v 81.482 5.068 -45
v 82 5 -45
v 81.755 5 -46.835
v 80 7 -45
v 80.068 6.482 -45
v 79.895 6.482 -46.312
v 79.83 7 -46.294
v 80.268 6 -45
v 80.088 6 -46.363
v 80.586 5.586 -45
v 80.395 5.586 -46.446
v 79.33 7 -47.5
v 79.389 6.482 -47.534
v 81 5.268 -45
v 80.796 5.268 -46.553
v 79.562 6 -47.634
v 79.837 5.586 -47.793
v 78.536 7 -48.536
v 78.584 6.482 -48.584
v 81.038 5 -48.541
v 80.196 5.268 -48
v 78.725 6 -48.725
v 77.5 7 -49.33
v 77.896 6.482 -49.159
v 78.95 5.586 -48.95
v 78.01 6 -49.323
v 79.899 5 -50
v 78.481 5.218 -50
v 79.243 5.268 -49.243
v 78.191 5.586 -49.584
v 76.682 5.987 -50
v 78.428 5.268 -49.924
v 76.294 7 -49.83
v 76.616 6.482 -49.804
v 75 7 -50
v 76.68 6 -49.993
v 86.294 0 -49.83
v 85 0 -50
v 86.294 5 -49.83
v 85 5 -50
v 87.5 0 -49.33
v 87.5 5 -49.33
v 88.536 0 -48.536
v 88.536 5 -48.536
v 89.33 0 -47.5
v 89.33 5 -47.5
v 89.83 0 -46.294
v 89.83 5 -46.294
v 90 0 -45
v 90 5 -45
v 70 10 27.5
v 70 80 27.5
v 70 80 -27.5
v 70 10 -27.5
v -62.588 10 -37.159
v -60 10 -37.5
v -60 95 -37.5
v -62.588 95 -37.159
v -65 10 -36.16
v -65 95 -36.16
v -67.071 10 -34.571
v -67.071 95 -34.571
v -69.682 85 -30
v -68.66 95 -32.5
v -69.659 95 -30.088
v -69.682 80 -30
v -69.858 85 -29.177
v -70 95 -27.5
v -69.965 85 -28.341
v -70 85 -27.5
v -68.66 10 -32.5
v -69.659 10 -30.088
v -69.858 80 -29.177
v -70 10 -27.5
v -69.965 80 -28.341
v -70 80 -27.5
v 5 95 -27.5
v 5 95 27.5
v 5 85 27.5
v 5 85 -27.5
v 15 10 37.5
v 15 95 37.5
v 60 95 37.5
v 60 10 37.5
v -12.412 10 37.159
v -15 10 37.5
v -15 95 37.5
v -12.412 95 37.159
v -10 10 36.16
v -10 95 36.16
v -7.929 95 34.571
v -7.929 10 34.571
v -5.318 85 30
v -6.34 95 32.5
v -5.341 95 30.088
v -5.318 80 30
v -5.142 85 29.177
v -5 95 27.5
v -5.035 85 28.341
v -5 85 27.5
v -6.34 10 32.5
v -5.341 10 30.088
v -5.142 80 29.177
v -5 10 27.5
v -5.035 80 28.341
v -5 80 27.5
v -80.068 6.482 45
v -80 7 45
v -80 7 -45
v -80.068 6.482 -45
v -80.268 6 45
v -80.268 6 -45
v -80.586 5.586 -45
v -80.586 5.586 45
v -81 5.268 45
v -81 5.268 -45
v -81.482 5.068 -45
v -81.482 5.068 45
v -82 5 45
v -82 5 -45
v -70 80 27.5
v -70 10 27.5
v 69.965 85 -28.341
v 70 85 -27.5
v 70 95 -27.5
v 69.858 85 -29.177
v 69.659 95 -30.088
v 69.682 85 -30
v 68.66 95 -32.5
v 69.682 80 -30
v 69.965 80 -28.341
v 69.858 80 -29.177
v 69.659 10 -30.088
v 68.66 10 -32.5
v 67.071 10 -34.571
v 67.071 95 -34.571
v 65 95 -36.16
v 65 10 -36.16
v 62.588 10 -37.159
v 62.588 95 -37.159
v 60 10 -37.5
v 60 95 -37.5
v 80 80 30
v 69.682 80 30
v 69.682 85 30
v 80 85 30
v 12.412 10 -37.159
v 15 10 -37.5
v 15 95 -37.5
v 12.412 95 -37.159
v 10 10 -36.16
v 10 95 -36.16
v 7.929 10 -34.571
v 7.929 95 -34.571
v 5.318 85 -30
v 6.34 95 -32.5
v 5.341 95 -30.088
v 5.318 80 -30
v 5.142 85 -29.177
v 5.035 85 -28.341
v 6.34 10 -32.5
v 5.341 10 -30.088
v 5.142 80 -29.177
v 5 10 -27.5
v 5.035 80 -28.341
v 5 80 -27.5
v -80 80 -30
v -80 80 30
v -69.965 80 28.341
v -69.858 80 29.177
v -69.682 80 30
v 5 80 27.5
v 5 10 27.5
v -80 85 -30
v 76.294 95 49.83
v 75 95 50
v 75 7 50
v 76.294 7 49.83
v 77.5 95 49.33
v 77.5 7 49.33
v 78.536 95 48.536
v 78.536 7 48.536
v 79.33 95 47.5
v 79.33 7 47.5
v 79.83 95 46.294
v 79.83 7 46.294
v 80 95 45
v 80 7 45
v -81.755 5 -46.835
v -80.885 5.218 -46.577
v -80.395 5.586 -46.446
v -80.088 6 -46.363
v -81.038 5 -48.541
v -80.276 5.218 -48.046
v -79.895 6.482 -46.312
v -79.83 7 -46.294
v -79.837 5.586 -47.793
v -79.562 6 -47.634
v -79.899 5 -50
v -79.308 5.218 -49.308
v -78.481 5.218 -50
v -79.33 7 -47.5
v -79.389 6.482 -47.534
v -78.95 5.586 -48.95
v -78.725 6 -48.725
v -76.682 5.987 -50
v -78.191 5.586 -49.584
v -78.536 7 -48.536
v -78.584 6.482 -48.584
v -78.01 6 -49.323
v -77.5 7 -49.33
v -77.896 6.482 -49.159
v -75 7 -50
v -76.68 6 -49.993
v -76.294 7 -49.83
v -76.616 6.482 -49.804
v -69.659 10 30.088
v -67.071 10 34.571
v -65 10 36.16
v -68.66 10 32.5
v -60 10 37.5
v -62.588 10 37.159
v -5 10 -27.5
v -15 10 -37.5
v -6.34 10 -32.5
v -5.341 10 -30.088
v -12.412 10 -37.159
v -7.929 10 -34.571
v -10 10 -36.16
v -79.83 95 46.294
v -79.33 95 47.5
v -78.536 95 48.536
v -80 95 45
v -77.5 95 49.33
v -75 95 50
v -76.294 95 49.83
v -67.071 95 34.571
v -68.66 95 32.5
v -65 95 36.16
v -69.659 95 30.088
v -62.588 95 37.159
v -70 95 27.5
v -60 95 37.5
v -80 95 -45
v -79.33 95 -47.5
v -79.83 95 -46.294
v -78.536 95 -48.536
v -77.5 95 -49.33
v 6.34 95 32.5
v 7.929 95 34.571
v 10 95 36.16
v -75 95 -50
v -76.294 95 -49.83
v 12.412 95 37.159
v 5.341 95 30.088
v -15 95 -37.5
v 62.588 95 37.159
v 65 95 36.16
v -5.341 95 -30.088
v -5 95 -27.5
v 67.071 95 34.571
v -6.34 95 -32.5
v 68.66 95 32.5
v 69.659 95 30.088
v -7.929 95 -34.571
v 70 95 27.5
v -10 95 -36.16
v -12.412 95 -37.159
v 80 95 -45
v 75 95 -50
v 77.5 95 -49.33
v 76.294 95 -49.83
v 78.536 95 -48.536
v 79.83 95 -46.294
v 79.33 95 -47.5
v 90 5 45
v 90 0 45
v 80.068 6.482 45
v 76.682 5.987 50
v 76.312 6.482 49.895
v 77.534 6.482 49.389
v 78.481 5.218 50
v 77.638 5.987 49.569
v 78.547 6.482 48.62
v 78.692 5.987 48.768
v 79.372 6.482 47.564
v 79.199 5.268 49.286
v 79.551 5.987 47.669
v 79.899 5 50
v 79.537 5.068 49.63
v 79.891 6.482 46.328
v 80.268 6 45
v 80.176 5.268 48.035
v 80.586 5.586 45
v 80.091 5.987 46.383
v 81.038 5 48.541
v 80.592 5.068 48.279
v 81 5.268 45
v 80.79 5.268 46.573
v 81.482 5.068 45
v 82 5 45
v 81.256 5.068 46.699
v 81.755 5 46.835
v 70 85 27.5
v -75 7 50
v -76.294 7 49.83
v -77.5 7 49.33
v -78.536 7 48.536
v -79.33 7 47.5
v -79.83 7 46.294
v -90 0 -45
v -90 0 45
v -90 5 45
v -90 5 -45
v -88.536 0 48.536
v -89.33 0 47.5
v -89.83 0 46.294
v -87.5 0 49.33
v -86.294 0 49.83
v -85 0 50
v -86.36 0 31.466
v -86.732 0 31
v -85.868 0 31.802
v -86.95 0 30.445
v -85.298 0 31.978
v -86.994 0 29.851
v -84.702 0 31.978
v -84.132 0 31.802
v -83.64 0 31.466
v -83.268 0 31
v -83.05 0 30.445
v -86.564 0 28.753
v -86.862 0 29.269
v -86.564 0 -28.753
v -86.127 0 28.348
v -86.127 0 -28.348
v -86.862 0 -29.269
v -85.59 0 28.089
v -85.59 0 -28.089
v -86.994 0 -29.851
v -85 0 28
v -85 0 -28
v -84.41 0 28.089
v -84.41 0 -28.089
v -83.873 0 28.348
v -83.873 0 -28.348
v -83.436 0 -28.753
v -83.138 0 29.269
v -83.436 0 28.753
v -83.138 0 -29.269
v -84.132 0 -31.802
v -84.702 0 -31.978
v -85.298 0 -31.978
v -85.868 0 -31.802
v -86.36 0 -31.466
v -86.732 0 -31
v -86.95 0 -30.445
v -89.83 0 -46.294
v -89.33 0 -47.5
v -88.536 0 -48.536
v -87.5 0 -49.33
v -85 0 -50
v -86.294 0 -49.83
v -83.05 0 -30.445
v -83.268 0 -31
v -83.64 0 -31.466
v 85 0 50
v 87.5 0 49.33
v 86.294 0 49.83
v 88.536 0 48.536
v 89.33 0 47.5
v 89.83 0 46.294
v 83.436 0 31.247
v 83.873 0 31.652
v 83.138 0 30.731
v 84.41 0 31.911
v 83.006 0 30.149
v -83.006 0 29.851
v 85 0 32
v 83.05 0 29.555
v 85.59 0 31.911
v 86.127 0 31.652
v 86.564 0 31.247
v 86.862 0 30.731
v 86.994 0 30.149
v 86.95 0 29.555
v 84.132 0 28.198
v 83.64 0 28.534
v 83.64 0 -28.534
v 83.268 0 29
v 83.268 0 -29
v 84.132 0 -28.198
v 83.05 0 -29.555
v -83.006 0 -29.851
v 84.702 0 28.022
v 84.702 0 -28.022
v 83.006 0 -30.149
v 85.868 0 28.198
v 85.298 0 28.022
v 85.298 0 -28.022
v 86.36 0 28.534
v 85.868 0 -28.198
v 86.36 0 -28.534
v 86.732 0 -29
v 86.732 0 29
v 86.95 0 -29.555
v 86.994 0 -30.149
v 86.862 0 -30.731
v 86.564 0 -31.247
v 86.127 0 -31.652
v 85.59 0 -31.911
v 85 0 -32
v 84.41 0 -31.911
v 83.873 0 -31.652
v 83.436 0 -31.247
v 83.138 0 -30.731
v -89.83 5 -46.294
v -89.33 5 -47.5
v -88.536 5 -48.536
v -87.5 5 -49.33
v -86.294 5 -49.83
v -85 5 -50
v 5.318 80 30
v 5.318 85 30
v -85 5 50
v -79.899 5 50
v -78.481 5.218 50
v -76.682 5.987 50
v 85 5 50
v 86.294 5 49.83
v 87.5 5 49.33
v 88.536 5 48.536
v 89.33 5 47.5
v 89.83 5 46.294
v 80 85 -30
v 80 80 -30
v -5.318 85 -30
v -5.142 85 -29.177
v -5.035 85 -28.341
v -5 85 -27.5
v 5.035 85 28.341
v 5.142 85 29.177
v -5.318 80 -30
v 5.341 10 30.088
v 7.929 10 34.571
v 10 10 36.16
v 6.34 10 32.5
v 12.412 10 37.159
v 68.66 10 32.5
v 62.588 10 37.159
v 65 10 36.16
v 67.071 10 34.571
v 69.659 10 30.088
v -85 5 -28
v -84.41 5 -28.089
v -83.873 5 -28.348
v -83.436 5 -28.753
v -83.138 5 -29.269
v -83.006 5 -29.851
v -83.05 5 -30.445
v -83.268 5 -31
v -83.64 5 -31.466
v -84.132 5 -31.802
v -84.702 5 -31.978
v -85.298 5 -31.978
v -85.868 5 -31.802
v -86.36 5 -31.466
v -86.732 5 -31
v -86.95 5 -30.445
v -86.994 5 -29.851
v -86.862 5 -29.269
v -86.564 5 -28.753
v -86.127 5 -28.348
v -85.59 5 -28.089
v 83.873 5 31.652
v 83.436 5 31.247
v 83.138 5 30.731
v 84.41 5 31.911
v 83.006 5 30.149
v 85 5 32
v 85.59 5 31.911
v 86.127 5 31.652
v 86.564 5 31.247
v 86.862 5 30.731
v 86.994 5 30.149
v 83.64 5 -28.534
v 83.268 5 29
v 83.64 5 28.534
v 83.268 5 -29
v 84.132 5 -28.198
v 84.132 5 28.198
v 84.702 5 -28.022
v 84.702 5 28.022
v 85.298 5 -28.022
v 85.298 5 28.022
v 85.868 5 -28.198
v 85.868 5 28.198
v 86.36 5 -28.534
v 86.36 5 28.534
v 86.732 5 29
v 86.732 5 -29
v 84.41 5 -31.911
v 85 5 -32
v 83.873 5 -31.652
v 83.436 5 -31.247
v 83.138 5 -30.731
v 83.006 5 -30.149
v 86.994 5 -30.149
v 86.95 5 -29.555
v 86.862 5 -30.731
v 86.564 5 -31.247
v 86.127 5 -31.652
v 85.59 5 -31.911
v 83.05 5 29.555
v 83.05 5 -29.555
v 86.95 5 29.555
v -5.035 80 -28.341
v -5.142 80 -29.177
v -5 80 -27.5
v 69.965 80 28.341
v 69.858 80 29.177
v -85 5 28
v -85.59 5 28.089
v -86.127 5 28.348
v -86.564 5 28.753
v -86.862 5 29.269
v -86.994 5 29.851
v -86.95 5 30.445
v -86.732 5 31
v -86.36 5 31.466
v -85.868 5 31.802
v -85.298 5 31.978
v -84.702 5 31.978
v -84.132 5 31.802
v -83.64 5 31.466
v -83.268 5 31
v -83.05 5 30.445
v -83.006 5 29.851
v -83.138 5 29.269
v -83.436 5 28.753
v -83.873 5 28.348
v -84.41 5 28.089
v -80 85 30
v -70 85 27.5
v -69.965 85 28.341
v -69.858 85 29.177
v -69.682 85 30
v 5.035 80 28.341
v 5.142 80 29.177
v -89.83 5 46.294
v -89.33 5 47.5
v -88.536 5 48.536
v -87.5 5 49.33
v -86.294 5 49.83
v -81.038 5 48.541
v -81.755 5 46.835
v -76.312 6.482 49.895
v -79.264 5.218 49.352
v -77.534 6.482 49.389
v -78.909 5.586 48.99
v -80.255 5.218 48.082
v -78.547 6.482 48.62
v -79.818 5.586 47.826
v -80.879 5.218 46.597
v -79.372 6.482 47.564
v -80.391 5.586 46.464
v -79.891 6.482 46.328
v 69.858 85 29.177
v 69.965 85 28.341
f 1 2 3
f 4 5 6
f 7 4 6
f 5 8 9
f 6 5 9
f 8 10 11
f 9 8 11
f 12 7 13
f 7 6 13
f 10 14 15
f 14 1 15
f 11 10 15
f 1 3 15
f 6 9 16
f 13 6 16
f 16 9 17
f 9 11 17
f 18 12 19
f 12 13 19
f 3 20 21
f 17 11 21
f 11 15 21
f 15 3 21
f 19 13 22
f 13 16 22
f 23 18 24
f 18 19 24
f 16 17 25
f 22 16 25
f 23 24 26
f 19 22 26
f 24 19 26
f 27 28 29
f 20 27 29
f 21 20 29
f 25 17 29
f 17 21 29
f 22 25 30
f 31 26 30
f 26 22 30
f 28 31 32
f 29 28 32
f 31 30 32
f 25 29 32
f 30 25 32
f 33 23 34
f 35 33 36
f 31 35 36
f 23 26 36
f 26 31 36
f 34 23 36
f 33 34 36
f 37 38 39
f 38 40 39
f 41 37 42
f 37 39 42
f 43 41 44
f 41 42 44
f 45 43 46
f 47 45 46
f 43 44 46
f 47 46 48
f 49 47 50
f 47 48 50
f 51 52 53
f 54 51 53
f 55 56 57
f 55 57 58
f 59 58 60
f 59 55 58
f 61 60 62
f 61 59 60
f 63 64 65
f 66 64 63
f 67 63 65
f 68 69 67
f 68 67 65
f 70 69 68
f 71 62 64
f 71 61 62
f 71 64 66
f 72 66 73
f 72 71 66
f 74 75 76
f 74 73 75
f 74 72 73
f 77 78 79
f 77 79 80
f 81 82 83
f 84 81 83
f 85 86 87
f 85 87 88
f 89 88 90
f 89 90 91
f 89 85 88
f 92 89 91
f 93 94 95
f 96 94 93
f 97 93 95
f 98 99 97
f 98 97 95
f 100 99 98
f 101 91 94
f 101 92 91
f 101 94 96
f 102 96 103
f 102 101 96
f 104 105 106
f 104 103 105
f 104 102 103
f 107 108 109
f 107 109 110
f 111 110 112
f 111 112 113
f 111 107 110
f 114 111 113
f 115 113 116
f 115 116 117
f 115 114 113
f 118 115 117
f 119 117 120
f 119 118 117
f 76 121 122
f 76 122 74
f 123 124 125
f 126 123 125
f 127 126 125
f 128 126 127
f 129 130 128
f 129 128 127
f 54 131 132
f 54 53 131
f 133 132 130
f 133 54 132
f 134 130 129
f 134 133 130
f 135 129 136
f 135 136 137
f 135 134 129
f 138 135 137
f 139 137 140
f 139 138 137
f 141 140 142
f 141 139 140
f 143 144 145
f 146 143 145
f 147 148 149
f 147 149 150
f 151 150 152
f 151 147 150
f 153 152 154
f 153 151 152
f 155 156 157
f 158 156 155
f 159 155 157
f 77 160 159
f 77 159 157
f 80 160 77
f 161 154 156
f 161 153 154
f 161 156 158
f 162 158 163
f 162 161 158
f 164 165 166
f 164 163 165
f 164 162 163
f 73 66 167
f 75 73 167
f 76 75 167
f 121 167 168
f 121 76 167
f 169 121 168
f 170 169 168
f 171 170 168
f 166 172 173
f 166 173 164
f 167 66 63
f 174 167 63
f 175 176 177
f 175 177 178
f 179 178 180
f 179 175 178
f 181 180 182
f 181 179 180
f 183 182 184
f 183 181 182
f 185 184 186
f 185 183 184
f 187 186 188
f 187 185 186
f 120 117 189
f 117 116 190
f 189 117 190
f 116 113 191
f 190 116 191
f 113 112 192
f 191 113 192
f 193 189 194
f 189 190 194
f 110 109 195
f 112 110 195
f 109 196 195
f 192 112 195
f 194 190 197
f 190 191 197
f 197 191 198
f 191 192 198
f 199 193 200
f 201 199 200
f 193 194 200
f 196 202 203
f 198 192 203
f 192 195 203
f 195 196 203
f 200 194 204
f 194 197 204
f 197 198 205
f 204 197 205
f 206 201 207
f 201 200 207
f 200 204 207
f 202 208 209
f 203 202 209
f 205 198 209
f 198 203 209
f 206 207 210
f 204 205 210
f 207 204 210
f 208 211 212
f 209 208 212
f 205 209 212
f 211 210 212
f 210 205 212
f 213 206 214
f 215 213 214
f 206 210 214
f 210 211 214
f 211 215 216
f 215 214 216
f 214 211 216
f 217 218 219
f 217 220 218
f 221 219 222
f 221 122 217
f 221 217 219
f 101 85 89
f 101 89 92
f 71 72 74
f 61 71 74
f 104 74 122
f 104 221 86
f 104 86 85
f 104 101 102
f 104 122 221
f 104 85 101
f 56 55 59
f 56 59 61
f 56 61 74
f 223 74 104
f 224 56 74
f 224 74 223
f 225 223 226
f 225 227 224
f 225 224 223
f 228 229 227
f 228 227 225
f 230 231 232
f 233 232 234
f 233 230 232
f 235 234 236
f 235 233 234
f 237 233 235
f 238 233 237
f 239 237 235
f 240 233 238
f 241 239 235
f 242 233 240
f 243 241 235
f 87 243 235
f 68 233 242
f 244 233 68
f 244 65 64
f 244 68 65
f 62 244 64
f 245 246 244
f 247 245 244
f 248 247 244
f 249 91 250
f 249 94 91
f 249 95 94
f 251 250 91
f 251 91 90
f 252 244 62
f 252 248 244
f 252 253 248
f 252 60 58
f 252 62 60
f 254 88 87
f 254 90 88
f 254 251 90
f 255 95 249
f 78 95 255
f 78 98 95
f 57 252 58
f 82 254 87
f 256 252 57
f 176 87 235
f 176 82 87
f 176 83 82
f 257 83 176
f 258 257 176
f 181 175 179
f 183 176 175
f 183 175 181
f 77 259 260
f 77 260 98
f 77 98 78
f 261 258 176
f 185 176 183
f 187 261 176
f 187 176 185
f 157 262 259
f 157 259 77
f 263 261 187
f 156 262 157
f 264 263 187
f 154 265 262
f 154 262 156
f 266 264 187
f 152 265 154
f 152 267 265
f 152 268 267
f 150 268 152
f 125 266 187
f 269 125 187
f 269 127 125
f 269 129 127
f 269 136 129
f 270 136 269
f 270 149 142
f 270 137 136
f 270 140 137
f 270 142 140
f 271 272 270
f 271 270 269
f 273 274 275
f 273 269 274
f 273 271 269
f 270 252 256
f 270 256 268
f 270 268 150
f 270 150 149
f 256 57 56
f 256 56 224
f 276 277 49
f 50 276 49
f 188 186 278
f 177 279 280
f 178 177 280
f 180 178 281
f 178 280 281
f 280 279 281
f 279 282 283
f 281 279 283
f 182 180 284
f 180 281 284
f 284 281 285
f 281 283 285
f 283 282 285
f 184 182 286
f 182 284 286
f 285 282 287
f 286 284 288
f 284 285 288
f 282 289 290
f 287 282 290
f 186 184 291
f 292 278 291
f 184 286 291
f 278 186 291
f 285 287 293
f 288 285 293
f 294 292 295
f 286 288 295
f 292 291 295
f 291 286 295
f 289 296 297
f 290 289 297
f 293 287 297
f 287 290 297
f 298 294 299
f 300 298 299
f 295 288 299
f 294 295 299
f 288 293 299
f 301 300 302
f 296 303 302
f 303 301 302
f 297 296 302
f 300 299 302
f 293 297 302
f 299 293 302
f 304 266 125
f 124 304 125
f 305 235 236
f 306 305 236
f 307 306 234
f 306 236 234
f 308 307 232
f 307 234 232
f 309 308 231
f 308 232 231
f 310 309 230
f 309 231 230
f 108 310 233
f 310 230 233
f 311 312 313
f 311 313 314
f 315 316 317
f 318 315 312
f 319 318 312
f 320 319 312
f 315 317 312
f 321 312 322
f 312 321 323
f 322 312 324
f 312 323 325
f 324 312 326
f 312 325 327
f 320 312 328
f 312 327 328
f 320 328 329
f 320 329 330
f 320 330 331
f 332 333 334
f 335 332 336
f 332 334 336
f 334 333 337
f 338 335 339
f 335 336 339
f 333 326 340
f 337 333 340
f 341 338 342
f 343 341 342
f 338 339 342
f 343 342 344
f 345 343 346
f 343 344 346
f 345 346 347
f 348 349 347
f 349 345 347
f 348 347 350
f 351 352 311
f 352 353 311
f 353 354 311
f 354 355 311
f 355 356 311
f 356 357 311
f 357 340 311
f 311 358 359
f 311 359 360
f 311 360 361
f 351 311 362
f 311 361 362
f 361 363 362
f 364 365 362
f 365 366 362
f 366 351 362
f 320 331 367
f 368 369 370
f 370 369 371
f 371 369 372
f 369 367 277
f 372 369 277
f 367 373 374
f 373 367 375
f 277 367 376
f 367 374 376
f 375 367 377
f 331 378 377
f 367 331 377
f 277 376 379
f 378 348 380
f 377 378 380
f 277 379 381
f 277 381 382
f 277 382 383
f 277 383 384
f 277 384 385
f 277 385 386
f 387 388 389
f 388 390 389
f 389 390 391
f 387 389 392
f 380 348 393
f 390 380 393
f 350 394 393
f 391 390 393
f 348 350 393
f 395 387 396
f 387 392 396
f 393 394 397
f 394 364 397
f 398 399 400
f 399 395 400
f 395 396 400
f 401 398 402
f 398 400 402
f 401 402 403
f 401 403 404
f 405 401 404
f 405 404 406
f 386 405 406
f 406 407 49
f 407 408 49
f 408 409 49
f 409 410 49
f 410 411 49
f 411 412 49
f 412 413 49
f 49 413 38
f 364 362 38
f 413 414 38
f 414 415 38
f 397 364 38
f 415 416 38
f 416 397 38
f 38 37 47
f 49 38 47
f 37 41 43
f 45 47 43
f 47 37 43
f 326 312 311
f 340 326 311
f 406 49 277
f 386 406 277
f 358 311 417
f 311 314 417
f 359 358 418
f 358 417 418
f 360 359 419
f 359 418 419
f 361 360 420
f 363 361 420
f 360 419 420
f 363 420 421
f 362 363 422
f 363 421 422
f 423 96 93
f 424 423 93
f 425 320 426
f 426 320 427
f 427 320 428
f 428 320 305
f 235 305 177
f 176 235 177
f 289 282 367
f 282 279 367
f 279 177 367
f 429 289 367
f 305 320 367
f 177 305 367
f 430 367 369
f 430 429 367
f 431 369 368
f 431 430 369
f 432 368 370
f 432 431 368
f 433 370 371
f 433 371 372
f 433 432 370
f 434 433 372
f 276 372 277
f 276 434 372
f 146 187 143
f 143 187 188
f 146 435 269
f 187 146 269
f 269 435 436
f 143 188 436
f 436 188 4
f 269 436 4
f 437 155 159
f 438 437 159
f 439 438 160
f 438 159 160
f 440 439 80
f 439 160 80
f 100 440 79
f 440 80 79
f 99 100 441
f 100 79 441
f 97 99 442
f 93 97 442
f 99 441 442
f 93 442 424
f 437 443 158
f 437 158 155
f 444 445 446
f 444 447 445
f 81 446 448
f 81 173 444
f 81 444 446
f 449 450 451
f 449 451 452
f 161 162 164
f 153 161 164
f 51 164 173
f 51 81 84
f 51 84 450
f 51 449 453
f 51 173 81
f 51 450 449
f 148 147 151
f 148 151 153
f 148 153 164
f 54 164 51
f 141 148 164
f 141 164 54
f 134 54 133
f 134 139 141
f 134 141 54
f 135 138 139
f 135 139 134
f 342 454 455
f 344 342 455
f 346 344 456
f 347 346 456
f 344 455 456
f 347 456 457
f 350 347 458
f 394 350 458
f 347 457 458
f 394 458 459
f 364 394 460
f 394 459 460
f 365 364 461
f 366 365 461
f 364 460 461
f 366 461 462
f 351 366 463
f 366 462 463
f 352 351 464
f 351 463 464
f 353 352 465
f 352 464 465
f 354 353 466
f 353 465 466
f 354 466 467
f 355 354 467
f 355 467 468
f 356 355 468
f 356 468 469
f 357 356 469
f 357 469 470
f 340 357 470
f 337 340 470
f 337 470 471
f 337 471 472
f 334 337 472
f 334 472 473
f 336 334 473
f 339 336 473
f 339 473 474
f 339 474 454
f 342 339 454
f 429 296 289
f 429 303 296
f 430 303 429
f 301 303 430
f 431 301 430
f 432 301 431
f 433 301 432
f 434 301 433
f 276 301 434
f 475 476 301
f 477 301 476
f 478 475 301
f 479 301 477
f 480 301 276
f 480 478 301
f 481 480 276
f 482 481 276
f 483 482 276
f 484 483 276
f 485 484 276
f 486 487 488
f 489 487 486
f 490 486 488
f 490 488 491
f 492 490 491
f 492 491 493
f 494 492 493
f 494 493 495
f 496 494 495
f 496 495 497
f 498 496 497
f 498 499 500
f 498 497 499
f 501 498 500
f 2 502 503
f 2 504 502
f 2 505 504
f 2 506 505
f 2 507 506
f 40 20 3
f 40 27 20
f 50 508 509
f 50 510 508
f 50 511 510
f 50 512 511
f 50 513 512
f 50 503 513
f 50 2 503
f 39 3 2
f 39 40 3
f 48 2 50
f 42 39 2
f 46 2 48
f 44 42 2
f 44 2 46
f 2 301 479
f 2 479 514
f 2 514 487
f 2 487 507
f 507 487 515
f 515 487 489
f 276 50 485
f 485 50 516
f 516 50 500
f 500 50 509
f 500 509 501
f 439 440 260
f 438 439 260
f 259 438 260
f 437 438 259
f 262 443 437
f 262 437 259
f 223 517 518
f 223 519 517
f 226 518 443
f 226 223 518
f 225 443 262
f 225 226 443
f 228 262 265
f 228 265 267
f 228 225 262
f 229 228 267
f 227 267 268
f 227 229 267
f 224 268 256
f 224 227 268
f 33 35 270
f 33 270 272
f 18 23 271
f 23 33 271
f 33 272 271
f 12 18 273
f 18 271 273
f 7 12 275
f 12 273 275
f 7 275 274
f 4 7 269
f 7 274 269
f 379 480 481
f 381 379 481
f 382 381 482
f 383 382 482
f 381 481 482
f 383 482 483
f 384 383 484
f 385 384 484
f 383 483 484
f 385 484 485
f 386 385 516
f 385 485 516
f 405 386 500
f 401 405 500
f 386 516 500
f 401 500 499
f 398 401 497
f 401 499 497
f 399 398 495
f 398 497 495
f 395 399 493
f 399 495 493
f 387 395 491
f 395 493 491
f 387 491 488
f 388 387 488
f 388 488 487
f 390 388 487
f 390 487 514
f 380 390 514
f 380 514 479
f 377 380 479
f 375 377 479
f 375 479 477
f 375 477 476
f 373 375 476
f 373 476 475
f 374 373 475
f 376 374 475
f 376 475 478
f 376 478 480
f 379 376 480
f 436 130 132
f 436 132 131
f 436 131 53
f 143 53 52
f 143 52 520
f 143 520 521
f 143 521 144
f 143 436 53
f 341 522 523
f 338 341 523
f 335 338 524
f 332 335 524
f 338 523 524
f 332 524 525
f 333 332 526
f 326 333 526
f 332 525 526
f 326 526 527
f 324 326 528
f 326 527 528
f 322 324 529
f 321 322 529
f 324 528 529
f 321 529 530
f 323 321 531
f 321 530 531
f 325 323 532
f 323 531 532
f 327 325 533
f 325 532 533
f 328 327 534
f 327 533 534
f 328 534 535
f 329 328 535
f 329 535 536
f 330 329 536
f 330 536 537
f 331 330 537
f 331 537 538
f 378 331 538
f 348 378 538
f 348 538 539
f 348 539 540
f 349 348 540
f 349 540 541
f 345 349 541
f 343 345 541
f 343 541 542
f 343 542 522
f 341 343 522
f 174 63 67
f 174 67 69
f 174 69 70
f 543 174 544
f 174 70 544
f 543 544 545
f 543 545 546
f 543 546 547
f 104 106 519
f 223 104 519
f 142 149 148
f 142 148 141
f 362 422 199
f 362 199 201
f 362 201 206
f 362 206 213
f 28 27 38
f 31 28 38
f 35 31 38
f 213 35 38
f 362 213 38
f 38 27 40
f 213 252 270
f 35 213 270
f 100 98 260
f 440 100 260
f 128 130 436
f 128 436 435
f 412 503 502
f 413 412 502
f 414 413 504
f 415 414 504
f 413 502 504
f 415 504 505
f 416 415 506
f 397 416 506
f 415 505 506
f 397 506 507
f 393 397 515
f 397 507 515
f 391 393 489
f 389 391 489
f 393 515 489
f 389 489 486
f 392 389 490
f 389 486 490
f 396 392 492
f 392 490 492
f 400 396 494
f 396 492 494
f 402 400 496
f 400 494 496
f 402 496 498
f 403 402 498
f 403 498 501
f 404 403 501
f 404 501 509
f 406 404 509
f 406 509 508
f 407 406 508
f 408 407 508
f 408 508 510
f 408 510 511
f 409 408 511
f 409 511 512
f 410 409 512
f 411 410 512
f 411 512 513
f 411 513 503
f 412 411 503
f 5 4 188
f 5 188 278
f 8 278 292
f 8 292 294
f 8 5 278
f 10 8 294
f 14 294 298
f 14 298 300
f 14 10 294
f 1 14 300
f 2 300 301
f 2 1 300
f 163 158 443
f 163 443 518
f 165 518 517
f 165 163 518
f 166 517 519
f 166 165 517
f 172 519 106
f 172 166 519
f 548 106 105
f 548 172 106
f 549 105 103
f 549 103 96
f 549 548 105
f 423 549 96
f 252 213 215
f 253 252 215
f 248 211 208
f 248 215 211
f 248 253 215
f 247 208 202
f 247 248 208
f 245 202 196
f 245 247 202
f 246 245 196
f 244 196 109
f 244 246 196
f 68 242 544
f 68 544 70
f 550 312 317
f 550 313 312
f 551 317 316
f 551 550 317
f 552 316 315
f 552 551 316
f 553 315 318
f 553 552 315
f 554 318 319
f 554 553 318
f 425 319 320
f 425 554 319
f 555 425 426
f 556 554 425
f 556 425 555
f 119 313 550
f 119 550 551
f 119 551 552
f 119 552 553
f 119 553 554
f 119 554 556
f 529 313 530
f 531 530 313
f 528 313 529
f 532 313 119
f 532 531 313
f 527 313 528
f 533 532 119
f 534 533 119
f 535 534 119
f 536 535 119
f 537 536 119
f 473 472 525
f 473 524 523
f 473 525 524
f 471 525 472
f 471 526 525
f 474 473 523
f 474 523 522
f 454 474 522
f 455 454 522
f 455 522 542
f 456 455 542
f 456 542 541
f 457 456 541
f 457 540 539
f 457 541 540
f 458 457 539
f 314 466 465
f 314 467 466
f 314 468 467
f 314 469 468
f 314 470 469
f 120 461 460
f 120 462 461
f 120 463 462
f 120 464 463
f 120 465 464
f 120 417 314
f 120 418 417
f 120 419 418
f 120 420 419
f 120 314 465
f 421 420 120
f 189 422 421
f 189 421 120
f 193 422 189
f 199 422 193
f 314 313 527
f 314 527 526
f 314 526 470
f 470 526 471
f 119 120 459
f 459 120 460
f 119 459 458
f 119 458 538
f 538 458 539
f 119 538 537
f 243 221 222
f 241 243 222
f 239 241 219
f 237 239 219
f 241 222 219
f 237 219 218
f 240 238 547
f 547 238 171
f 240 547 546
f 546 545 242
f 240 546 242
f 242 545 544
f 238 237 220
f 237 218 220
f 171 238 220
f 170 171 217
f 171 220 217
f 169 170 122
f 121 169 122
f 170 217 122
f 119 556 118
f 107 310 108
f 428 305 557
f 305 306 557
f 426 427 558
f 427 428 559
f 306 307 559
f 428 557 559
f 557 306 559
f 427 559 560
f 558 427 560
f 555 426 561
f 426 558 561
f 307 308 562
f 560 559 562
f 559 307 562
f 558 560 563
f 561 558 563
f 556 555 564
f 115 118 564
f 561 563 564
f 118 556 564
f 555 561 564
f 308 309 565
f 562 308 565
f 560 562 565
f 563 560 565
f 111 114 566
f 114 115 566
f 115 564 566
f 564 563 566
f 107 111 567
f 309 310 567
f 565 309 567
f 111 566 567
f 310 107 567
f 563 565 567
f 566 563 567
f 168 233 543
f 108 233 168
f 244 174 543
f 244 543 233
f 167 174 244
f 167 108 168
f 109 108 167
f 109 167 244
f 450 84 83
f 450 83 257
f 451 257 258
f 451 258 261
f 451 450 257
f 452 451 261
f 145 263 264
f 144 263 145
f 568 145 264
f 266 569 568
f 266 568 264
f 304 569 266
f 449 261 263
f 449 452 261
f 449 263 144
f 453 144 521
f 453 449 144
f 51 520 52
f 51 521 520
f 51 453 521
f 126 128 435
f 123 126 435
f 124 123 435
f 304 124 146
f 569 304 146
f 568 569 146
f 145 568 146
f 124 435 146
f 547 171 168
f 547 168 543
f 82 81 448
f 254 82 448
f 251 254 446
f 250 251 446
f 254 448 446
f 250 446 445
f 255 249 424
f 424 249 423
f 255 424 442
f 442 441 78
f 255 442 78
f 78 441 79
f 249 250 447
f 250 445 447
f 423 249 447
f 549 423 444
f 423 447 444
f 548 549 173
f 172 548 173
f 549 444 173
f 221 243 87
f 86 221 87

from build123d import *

# Parameters (mm, degrees)
SKETCH1_W               = 180
SKETCH1_H               = 100
BOSS_EXTRUDE1_DEPTH     = 5
SKETCH2_W               = 160
SKETCH2_H               = 100
BOSS_EXTRUDE2_DEPTH     = 90
SKETCH3_R               = 2
CUT_EXTRUDE1_DEPTH      = 137.747943312
FILLET1_R               = 5
FILLET2_R               = 2
SKETCH4_W               = 65
SKETCH4_H               = 75
CUT_EXTRUDE2_DEPTH      = 85
FILLET3_R               = 10
CUT_EXTRUDE3_DEPTH      = 202.059692701
CUT_EXTRUDE3_DEPTH_BACK = 202.059692701
SKETCH5_W               = 60
SKETCH5_H               = 5


with BuildPart() as part:
    # Sketch1 → Boss-Extrude1 (new body)
    with BuildSketch(Plane(origin=(0, 0, 0), x_dir=(1, 0, 0), z_dir=(0, 1, 0))):
        Rectangle(SKETCH1_W, SKETCH1_H)
    extrude(amount=BOSS_EXTRUDE1_DEPTH)

    # Sketch2 → Boss-Extrude2 (add)
    with BuildSketch(Plane(origin=(0, 5, 0), x_dir=(1, 0, 0), z_dir=(0, 1, 0))):
        Rectangle(SKETCH2_W, SKETCH2_H)
    extrude(amount=BOSS_EXTRUDE2_DEPTH)

    # Sketch3 → Cut-Extrude1 (cut, through all)
    with BuildSketch(Plane(origin=(0, 5, 0), x_dir=(1, 0, 0), z_dir=(0, 1, 0))):
        with Locations(Location((-85, 30, 0), (0, 0, 270))):
            Circle(SKETCH3_R)
        with Locations(Location((85, 30, 0), (0, 0, 90))):
            Circle(SKETCH3_R)
        with Locations(Location((85, -30, 0), (0, 0, 270))):
            Circle(SKETCH3_R)
        with Locations(Location((-85, -30, 0), (0, 0, 90))):
            Circle(SKETCH3_R)
    extrude(amount=-CUT_EXTRUDE1_DEPTH, mode=Mode.SUBTRACT)

    # Fillet1
    fillet1_edges = [part.edges().sort_by_distance(p)[0] for p in [
        (-80, 50, -50),
        (-80, 50, 50),
        (80, 50, 50),
        (80, 50, -50),
        (-90, 2.5, -50),
        (90, 2.5, -50),
        (90, 2.5, 50),
        (-90, 2.5, 50),
    ]]
    fillet(fillet1_edges, radius=FILLET1_R)

    # Fillet2
    # the kernel refuses this fillet: 2 mm, written as the material it adds along each edge
    with BuildSketch(Plane(origin=(-80, 5, 45), x_dir=(0, 1, 0), z_dir=(0, 0, -1)), Plane(origin=(80, 5, -45), x_dir=(0, 1, 0), z_dir=(0, 0, 1))) as fillet2_piece_1:
        with BuildLine():
            CenterArc((FILLET2_R, -FILLET2_R), FILLET2_R, 90, 90)
            Line((0, -FILLET2_R), (0, 0))
            Line((0, 0), (FILLET2_R, 0))
        make_face()
    extrude(amount=90)
    with BuildSketch(Plane(origin=(-75, 5, -45), x_dir=(-1, 0, 0), z_dir=(0, 0, 1))) as fillet2_piece_2_section:
        with BuildLine():
            CenterArc((5 + FILLET2_R, -FILLET2_R), FILLET2_R, 90, 90)
            Line((5 + FILLET2_R, 0), (5, 0))
            Line((5, 0), (5, -FILLET2_R))
        make_face()
    fillet2_piece_2 = revolve(axis=Axis((-75, 5, -45), (0, -1, 0)), revolution_arc=147.318795695, mode=Mode.PRIVATE)
    fillet2_piece_2 = split(fillet2_piece_2, bisect_by=Plane(origin=(-78.61306887, 5.526930213, -50), z_dir=(0, 0, 1)), keep=Keep.TOP, mode=Mode.PRIVATE)
    add(fillet2_piece_2)
    with BuildSketch(Plane(origin=(75, 5, -45), x_dir=(1, 0, 0), z_dir=(0, 0, 1))) as fillet2_piece_3_section:
        with BuildLine():
            CenterArc((5 + FILLET2_R, FILLET2_R), FILLET2_R, 180, 90)
            Line((5 + FILLET2_R, 0), (5, 0))
            Line((5, 0), (5, FILLET2_R))
        make_face()
    fillet2_piece_3 = revolve(axis=Axis((75, 5, -45), (0, 1, 0)), revolution_arc=147.318795695, mode=Mode.PRIVATE)
    fillet2_piece_3 = split(fillet2_piece_3, bisect_by=Plane(origin=(78.613069351, 5.526929856, -50), z_dir=(0, 0, 1)), keep=Keep.TOP, mode=Mode.PRIVATE)
    add(fillet2_piece_3)
    with BuildSketch(Plane(origin=(-75, 5, 45), x_dir=(0.8416879607506224, 0, 0.5399642365263265), z_dir=(0.5399642365263265, 0, -0.8416879607506224))) as fillet2_piece_4_section:
        with BuildLine():
            CenterArc((5 + FILLET2_R, -FILLET2_R), FILLET2_R, 90, 90)
            Line((5, -FILLET2_R), (5, 0))
            Line((5, 0), (5 + FILLET2_R, 0))
        make_face()
    fillet2_piece_4 = revolve(axis=Axis((-75, 5, 45), (0, -1, 0)), revolution_arc=147.318795695, mode=Mode.PRIVATE)
    fillet2_piece_4 = split(fillet2_piece_4, bisect_by=Plane(origin=(-78.614624166, 5.52723882, 50), z_dir=(0, 0, -1)), keep=Keep.TOP, mode=Mode.PRIVATE)
    add(fillet2_piece_4)
    with BuildSketch(Plane(origin=(75, 5, 45), x_dir=(-0.8416879607506224, 0, 0.5399642365263265), z_dir=(-0.5399642365263265, 0, -0.8416879607506224))) as fillet2_piece_5_section:
        with BuildLine():
            CenterArc((5 + FILLET2_R, FILLET2_R), FILLET2_R, 180, 90)
            Line((5 + FILLET2_R, 0), (5, 0))
            Line((5, 0), (5, FILLET2_R))
        make_face()
    fillet2_piece_5 = revolve(axis=Axis((75, 5, 45), (0, 1, 0)), revolution_arc=147.318795695, mode=Mode.PRIVATE)
    fillet2_piece_5 = split(fillet2_piece_5, bisect_by=Plane(origin=(78.613068706, 5.526930627, 50), z_dir=(0, 0, -1)), keep=Keep.TOP, mode=Mode.PRIVATE)
    add(fillet2_piece_5)

    # Sketch4 → Cut-Extrude2 (cut)
    with BuildSketch(Plane(origin=(0, 95, 0), x_dir=(1, 0, 0), z_dir=(0, 1, 0))):
        with Locations((-37.5, 0)):
            Rectangle(SKETCH4_W, SKETCH4_H)
        with Locations((37.5, 0)):
            Rectangle(SKETCH4_W, SKETCH4_H)
    extrude(amount=-CUT_EXTRUDE2_DEPTH, mode=Mode.SUBTRACT)

    # Fillet3
    fillet3_edges = [part.edges().sort_by_distance(p)[0] for p in [
        (-70, 52.5, 37.5),
        (-70, 52.5, -37.5),
        (-5, 52.5, -37.5),
        (-5, 52.5, 37.5),
        (5, 52.5, 37.5),
        (5, 52.5, -37.5),
        (70, 52.5, -37.5),
        (70, 52.5, 37.5),
    ]]
    fillet(fillet3_edges, radius=FILLET3_R)

    # Sketch5 → Cut-Extrude3 (cut, two sides: drawn at the far end of the back side and taken through both)
    with BuildSketch(Plane.ZY.offset(80).offset(-CUT_EXTRUDE3_DEPTH_BACK)):
        with Locations((0, 82.5)):
            Rectangle(SKETCH5_W, SKETCH5_H)
    extrude(amount=CUT_EXTRUDE3_DEPTH + CUT_EXTRUDE3_DEPTH_BACK, mode=Mode.SUBTRACT)


solid = part.part
